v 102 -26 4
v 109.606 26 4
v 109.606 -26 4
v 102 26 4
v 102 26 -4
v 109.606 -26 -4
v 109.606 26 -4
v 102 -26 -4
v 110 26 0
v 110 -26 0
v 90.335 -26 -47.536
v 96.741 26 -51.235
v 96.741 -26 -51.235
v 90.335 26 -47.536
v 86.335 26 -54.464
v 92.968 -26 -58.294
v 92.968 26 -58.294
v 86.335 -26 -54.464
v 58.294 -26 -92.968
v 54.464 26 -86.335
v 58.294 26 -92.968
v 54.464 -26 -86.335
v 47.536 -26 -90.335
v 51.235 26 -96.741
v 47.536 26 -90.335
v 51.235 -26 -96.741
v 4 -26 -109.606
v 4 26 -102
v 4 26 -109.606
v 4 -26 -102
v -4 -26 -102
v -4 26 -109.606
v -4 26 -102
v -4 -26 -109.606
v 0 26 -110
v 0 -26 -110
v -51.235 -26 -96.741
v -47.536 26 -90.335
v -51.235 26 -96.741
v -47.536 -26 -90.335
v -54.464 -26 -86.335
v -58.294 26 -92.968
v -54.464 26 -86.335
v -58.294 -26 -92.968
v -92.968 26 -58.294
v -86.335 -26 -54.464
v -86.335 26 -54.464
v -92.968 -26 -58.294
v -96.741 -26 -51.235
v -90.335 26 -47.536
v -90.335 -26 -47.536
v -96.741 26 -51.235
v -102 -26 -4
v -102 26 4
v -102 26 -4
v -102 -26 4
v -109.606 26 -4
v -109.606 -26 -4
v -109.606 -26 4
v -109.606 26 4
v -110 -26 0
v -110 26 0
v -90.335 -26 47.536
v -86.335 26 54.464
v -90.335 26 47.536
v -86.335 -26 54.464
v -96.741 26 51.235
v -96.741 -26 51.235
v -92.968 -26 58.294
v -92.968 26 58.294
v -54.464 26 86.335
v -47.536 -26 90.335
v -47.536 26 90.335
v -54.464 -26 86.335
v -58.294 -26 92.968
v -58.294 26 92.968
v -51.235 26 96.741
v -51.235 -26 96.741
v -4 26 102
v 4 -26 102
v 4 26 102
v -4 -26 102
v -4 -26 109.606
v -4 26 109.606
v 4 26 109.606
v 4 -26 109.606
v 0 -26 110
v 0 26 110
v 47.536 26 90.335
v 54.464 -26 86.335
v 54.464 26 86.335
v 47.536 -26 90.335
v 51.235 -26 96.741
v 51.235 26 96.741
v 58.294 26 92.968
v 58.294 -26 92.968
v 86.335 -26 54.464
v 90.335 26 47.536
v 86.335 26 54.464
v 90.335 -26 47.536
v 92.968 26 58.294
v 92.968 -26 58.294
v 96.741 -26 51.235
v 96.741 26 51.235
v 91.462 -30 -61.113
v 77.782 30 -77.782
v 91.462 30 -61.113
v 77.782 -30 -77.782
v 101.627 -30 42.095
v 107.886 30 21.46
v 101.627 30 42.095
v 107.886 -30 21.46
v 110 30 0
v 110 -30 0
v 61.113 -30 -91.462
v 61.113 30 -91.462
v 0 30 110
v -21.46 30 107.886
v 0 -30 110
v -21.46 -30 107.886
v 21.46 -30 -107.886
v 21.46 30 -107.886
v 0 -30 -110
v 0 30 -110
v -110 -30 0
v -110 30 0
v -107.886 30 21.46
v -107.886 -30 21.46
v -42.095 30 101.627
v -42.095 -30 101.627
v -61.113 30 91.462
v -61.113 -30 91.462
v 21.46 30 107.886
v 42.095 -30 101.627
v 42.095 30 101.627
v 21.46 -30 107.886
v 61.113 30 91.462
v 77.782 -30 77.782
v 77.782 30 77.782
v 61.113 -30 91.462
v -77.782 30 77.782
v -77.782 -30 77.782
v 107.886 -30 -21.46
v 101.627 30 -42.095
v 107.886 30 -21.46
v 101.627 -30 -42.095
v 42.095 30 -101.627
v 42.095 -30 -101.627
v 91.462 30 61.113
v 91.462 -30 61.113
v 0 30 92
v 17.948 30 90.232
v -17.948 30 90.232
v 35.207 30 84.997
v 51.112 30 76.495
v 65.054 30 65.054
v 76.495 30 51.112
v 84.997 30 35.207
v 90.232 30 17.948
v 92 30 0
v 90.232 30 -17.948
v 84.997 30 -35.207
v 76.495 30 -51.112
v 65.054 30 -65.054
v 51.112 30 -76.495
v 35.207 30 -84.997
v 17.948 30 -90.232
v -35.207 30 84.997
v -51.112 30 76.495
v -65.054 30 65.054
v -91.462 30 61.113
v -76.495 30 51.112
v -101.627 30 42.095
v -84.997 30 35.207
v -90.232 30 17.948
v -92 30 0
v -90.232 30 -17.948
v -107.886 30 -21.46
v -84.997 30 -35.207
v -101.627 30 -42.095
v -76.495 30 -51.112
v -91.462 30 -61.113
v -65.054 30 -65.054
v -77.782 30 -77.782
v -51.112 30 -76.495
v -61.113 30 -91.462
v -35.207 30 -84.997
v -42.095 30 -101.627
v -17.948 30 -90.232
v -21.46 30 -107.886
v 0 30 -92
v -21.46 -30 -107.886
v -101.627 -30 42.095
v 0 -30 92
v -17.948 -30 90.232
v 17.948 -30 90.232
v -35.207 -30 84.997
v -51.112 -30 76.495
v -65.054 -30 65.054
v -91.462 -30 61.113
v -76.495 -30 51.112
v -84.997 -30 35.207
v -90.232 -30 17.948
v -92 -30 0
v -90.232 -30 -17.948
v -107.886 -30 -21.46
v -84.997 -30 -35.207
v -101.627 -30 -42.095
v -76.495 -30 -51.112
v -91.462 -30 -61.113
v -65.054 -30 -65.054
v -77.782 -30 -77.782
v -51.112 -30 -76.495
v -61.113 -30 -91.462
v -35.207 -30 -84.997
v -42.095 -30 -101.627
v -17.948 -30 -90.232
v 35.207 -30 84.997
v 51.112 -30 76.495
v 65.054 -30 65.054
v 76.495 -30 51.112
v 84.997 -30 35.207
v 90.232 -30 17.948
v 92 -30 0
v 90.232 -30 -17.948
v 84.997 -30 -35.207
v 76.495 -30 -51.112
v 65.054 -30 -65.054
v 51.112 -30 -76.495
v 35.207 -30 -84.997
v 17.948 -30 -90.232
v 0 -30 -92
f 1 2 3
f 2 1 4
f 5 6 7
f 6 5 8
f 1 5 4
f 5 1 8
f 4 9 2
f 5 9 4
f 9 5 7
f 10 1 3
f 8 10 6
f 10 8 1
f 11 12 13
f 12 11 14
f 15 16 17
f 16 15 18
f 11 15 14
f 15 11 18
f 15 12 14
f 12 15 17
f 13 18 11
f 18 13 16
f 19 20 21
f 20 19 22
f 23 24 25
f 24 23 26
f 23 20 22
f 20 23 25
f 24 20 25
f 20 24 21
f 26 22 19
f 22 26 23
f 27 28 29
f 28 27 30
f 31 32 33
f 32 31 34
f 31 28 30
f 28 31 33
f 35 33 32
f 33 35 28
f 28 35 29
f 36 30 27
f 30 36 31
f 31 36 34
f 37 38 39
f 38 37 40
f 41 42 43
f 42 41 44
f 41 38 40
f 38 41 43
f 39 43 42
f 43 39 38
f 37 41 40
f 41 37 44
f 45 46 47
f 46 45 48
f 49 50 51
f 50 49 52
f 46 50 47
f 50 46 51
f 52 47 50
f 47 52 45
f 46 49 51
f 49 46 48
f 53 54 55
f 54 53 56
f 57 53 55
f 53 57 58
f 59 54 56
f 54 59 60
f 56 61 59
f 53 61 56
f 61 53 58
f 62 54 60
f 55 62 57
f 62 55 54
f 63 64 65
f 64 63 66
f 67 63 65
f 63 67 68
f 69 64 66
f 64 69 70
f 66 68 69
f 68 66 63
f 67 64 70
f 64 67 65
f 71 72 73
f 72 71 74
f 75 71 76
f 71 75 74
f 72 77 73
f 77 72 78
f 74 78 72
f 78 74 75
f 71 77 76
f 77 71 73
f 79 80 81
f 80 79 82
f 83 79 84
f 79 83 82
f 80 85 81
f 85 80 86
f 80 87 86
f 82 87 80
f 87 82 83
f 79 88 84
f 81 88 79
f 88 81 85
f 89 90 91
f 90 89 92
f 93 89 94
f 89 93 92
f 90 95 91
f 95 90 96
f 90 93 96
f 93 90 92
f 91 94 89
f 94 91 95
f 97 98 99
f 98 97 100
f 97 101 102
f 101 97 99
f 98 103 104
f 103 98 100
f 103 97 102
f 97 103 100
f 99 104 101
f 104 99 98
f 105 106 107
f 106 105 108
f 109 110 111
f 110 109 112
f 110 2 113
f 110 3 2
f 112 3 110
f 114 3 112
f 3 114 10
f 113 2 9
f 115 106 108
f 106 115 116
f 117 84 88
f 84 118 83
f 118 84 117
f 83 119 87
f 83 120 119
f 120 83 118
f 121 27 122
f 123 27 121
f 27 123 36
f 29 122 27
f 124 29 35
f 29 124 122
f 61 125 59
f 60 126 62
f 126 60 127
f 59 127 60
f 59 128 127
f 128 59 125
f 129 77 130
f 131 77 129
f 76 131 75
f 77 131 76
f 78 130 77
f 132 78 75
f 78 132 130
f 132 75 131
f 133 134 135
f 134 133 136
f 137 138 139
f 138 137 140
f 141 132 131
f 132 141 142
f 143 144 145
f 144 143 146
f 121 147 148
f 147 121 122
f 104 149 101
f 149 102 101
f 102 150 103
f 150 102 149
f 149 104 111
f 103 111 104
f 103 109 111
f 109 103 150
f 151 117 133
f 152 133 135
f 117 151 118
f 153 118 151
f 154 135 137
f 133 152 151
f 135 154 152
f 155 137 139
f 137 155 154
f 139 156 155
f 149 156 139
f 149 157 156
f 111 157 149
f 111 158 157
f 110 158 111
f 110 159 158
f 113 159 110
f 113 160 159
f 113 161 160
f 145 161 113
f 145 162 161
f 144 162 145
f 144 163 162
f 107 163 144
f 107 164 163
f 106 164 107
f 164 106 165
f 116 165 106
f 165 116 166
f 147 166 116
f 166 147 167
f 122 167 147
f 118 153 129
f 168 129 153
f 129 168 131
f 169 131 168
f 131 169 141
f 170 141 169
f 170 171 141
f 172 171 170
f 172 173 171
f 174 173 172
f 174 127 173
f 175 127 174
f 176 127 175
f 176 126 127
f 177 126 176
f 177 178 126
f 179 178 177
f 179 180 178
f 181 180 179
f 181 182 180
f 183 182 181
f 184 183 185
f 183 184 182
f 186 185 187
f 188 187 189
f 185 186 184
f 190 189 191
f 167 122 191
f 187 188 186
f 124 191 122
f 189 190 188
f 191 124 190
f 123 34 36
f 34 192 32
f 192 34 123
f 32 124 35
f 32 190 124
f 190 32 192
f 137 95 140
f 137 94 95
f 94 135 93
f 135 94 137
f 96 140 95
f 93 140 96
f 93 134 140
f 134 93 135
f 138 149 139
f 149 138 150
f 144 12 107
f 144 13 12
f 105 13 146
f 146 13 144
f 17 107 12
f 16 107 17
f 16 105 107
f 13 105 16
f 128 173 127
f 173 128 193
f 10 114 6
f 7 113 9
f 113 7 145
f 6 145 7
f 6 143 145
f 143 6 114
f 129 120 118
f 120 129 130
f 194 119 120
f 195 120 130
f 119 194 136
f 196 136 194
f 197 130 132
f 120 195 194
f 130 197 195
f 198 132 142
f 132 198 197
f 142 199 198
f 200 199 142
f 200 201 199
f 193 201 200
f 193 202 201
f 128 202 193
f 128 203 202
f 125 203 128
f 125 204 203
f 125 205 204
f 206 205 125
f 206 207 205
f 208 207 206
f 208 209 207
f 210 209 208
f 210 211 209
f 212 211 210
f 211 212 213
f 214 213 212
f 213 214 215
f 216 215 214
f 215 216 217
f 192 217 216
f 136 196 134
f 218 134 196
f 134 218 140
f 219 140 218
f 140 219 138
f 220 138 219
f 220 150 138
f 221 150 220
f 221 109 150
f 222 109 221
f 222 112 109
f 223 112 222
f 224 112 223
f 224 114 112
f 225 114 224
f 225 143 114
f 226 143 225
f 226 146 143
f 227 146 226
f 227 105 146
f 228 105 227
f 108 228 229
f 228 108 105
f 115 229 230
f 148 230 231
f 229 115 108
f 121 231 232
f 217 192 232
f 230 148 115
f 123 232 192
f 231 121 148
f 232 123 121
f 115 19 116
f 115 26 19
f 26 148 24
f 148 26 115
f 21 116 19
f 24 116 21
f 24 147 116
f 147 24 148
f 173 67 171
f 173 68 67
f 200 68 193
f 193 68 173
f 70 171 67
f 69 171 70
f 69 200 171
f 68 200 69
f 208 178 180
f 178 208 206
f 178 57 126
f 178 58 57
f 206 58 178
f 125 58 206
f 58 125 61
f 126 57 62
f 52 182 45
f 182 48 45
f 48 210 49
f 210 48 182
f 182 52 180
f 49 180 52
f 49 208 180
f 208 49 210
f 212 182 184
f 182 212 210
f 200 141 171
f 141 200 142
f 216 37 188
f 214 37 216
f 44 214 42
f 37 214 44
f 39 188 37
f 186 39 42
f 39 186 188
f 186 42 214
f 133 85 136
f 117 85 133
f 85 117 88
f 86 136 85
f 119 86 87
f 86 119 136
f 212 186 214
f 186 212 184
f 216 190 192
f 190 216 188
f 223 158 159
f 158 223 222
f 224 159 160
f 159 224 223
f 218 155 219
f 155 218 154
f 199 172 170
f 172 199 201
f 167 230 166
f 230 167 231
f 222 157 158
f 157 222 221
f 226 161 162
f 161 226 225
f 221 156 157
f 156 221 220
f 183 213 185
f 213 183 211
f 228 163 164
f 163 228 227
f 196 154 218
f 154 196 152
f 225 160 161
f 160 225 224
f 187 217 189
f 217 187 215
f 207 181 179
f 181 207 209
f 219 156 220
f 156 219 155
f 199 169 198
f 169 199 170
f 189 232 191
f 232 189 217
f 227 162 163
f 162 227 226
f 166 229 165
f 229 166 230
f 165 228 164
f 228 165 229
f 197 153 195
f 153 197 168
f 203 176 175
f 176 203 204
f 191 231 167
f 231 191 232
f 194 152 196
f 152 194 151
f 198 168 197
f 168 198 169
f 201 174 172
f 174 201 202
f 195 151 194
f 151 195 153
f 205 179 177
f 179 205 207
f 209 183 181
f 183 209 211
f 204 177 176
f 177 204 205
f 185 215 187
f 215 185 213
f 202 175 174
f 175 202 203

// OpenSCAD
use <main.scad>
drive_wheel_diameter = 220;
drive_wheel_radius   = 110;
drive_wheel_width    = 60;
drive_wheel_track    = 620;
drive_wheel_axle_z   = 110;
show_component_labels = false;
translate([0, drive_wheel_track / 2, -drive_wheel_axle_z])
    drive_wheel_tire(-1, 0);
